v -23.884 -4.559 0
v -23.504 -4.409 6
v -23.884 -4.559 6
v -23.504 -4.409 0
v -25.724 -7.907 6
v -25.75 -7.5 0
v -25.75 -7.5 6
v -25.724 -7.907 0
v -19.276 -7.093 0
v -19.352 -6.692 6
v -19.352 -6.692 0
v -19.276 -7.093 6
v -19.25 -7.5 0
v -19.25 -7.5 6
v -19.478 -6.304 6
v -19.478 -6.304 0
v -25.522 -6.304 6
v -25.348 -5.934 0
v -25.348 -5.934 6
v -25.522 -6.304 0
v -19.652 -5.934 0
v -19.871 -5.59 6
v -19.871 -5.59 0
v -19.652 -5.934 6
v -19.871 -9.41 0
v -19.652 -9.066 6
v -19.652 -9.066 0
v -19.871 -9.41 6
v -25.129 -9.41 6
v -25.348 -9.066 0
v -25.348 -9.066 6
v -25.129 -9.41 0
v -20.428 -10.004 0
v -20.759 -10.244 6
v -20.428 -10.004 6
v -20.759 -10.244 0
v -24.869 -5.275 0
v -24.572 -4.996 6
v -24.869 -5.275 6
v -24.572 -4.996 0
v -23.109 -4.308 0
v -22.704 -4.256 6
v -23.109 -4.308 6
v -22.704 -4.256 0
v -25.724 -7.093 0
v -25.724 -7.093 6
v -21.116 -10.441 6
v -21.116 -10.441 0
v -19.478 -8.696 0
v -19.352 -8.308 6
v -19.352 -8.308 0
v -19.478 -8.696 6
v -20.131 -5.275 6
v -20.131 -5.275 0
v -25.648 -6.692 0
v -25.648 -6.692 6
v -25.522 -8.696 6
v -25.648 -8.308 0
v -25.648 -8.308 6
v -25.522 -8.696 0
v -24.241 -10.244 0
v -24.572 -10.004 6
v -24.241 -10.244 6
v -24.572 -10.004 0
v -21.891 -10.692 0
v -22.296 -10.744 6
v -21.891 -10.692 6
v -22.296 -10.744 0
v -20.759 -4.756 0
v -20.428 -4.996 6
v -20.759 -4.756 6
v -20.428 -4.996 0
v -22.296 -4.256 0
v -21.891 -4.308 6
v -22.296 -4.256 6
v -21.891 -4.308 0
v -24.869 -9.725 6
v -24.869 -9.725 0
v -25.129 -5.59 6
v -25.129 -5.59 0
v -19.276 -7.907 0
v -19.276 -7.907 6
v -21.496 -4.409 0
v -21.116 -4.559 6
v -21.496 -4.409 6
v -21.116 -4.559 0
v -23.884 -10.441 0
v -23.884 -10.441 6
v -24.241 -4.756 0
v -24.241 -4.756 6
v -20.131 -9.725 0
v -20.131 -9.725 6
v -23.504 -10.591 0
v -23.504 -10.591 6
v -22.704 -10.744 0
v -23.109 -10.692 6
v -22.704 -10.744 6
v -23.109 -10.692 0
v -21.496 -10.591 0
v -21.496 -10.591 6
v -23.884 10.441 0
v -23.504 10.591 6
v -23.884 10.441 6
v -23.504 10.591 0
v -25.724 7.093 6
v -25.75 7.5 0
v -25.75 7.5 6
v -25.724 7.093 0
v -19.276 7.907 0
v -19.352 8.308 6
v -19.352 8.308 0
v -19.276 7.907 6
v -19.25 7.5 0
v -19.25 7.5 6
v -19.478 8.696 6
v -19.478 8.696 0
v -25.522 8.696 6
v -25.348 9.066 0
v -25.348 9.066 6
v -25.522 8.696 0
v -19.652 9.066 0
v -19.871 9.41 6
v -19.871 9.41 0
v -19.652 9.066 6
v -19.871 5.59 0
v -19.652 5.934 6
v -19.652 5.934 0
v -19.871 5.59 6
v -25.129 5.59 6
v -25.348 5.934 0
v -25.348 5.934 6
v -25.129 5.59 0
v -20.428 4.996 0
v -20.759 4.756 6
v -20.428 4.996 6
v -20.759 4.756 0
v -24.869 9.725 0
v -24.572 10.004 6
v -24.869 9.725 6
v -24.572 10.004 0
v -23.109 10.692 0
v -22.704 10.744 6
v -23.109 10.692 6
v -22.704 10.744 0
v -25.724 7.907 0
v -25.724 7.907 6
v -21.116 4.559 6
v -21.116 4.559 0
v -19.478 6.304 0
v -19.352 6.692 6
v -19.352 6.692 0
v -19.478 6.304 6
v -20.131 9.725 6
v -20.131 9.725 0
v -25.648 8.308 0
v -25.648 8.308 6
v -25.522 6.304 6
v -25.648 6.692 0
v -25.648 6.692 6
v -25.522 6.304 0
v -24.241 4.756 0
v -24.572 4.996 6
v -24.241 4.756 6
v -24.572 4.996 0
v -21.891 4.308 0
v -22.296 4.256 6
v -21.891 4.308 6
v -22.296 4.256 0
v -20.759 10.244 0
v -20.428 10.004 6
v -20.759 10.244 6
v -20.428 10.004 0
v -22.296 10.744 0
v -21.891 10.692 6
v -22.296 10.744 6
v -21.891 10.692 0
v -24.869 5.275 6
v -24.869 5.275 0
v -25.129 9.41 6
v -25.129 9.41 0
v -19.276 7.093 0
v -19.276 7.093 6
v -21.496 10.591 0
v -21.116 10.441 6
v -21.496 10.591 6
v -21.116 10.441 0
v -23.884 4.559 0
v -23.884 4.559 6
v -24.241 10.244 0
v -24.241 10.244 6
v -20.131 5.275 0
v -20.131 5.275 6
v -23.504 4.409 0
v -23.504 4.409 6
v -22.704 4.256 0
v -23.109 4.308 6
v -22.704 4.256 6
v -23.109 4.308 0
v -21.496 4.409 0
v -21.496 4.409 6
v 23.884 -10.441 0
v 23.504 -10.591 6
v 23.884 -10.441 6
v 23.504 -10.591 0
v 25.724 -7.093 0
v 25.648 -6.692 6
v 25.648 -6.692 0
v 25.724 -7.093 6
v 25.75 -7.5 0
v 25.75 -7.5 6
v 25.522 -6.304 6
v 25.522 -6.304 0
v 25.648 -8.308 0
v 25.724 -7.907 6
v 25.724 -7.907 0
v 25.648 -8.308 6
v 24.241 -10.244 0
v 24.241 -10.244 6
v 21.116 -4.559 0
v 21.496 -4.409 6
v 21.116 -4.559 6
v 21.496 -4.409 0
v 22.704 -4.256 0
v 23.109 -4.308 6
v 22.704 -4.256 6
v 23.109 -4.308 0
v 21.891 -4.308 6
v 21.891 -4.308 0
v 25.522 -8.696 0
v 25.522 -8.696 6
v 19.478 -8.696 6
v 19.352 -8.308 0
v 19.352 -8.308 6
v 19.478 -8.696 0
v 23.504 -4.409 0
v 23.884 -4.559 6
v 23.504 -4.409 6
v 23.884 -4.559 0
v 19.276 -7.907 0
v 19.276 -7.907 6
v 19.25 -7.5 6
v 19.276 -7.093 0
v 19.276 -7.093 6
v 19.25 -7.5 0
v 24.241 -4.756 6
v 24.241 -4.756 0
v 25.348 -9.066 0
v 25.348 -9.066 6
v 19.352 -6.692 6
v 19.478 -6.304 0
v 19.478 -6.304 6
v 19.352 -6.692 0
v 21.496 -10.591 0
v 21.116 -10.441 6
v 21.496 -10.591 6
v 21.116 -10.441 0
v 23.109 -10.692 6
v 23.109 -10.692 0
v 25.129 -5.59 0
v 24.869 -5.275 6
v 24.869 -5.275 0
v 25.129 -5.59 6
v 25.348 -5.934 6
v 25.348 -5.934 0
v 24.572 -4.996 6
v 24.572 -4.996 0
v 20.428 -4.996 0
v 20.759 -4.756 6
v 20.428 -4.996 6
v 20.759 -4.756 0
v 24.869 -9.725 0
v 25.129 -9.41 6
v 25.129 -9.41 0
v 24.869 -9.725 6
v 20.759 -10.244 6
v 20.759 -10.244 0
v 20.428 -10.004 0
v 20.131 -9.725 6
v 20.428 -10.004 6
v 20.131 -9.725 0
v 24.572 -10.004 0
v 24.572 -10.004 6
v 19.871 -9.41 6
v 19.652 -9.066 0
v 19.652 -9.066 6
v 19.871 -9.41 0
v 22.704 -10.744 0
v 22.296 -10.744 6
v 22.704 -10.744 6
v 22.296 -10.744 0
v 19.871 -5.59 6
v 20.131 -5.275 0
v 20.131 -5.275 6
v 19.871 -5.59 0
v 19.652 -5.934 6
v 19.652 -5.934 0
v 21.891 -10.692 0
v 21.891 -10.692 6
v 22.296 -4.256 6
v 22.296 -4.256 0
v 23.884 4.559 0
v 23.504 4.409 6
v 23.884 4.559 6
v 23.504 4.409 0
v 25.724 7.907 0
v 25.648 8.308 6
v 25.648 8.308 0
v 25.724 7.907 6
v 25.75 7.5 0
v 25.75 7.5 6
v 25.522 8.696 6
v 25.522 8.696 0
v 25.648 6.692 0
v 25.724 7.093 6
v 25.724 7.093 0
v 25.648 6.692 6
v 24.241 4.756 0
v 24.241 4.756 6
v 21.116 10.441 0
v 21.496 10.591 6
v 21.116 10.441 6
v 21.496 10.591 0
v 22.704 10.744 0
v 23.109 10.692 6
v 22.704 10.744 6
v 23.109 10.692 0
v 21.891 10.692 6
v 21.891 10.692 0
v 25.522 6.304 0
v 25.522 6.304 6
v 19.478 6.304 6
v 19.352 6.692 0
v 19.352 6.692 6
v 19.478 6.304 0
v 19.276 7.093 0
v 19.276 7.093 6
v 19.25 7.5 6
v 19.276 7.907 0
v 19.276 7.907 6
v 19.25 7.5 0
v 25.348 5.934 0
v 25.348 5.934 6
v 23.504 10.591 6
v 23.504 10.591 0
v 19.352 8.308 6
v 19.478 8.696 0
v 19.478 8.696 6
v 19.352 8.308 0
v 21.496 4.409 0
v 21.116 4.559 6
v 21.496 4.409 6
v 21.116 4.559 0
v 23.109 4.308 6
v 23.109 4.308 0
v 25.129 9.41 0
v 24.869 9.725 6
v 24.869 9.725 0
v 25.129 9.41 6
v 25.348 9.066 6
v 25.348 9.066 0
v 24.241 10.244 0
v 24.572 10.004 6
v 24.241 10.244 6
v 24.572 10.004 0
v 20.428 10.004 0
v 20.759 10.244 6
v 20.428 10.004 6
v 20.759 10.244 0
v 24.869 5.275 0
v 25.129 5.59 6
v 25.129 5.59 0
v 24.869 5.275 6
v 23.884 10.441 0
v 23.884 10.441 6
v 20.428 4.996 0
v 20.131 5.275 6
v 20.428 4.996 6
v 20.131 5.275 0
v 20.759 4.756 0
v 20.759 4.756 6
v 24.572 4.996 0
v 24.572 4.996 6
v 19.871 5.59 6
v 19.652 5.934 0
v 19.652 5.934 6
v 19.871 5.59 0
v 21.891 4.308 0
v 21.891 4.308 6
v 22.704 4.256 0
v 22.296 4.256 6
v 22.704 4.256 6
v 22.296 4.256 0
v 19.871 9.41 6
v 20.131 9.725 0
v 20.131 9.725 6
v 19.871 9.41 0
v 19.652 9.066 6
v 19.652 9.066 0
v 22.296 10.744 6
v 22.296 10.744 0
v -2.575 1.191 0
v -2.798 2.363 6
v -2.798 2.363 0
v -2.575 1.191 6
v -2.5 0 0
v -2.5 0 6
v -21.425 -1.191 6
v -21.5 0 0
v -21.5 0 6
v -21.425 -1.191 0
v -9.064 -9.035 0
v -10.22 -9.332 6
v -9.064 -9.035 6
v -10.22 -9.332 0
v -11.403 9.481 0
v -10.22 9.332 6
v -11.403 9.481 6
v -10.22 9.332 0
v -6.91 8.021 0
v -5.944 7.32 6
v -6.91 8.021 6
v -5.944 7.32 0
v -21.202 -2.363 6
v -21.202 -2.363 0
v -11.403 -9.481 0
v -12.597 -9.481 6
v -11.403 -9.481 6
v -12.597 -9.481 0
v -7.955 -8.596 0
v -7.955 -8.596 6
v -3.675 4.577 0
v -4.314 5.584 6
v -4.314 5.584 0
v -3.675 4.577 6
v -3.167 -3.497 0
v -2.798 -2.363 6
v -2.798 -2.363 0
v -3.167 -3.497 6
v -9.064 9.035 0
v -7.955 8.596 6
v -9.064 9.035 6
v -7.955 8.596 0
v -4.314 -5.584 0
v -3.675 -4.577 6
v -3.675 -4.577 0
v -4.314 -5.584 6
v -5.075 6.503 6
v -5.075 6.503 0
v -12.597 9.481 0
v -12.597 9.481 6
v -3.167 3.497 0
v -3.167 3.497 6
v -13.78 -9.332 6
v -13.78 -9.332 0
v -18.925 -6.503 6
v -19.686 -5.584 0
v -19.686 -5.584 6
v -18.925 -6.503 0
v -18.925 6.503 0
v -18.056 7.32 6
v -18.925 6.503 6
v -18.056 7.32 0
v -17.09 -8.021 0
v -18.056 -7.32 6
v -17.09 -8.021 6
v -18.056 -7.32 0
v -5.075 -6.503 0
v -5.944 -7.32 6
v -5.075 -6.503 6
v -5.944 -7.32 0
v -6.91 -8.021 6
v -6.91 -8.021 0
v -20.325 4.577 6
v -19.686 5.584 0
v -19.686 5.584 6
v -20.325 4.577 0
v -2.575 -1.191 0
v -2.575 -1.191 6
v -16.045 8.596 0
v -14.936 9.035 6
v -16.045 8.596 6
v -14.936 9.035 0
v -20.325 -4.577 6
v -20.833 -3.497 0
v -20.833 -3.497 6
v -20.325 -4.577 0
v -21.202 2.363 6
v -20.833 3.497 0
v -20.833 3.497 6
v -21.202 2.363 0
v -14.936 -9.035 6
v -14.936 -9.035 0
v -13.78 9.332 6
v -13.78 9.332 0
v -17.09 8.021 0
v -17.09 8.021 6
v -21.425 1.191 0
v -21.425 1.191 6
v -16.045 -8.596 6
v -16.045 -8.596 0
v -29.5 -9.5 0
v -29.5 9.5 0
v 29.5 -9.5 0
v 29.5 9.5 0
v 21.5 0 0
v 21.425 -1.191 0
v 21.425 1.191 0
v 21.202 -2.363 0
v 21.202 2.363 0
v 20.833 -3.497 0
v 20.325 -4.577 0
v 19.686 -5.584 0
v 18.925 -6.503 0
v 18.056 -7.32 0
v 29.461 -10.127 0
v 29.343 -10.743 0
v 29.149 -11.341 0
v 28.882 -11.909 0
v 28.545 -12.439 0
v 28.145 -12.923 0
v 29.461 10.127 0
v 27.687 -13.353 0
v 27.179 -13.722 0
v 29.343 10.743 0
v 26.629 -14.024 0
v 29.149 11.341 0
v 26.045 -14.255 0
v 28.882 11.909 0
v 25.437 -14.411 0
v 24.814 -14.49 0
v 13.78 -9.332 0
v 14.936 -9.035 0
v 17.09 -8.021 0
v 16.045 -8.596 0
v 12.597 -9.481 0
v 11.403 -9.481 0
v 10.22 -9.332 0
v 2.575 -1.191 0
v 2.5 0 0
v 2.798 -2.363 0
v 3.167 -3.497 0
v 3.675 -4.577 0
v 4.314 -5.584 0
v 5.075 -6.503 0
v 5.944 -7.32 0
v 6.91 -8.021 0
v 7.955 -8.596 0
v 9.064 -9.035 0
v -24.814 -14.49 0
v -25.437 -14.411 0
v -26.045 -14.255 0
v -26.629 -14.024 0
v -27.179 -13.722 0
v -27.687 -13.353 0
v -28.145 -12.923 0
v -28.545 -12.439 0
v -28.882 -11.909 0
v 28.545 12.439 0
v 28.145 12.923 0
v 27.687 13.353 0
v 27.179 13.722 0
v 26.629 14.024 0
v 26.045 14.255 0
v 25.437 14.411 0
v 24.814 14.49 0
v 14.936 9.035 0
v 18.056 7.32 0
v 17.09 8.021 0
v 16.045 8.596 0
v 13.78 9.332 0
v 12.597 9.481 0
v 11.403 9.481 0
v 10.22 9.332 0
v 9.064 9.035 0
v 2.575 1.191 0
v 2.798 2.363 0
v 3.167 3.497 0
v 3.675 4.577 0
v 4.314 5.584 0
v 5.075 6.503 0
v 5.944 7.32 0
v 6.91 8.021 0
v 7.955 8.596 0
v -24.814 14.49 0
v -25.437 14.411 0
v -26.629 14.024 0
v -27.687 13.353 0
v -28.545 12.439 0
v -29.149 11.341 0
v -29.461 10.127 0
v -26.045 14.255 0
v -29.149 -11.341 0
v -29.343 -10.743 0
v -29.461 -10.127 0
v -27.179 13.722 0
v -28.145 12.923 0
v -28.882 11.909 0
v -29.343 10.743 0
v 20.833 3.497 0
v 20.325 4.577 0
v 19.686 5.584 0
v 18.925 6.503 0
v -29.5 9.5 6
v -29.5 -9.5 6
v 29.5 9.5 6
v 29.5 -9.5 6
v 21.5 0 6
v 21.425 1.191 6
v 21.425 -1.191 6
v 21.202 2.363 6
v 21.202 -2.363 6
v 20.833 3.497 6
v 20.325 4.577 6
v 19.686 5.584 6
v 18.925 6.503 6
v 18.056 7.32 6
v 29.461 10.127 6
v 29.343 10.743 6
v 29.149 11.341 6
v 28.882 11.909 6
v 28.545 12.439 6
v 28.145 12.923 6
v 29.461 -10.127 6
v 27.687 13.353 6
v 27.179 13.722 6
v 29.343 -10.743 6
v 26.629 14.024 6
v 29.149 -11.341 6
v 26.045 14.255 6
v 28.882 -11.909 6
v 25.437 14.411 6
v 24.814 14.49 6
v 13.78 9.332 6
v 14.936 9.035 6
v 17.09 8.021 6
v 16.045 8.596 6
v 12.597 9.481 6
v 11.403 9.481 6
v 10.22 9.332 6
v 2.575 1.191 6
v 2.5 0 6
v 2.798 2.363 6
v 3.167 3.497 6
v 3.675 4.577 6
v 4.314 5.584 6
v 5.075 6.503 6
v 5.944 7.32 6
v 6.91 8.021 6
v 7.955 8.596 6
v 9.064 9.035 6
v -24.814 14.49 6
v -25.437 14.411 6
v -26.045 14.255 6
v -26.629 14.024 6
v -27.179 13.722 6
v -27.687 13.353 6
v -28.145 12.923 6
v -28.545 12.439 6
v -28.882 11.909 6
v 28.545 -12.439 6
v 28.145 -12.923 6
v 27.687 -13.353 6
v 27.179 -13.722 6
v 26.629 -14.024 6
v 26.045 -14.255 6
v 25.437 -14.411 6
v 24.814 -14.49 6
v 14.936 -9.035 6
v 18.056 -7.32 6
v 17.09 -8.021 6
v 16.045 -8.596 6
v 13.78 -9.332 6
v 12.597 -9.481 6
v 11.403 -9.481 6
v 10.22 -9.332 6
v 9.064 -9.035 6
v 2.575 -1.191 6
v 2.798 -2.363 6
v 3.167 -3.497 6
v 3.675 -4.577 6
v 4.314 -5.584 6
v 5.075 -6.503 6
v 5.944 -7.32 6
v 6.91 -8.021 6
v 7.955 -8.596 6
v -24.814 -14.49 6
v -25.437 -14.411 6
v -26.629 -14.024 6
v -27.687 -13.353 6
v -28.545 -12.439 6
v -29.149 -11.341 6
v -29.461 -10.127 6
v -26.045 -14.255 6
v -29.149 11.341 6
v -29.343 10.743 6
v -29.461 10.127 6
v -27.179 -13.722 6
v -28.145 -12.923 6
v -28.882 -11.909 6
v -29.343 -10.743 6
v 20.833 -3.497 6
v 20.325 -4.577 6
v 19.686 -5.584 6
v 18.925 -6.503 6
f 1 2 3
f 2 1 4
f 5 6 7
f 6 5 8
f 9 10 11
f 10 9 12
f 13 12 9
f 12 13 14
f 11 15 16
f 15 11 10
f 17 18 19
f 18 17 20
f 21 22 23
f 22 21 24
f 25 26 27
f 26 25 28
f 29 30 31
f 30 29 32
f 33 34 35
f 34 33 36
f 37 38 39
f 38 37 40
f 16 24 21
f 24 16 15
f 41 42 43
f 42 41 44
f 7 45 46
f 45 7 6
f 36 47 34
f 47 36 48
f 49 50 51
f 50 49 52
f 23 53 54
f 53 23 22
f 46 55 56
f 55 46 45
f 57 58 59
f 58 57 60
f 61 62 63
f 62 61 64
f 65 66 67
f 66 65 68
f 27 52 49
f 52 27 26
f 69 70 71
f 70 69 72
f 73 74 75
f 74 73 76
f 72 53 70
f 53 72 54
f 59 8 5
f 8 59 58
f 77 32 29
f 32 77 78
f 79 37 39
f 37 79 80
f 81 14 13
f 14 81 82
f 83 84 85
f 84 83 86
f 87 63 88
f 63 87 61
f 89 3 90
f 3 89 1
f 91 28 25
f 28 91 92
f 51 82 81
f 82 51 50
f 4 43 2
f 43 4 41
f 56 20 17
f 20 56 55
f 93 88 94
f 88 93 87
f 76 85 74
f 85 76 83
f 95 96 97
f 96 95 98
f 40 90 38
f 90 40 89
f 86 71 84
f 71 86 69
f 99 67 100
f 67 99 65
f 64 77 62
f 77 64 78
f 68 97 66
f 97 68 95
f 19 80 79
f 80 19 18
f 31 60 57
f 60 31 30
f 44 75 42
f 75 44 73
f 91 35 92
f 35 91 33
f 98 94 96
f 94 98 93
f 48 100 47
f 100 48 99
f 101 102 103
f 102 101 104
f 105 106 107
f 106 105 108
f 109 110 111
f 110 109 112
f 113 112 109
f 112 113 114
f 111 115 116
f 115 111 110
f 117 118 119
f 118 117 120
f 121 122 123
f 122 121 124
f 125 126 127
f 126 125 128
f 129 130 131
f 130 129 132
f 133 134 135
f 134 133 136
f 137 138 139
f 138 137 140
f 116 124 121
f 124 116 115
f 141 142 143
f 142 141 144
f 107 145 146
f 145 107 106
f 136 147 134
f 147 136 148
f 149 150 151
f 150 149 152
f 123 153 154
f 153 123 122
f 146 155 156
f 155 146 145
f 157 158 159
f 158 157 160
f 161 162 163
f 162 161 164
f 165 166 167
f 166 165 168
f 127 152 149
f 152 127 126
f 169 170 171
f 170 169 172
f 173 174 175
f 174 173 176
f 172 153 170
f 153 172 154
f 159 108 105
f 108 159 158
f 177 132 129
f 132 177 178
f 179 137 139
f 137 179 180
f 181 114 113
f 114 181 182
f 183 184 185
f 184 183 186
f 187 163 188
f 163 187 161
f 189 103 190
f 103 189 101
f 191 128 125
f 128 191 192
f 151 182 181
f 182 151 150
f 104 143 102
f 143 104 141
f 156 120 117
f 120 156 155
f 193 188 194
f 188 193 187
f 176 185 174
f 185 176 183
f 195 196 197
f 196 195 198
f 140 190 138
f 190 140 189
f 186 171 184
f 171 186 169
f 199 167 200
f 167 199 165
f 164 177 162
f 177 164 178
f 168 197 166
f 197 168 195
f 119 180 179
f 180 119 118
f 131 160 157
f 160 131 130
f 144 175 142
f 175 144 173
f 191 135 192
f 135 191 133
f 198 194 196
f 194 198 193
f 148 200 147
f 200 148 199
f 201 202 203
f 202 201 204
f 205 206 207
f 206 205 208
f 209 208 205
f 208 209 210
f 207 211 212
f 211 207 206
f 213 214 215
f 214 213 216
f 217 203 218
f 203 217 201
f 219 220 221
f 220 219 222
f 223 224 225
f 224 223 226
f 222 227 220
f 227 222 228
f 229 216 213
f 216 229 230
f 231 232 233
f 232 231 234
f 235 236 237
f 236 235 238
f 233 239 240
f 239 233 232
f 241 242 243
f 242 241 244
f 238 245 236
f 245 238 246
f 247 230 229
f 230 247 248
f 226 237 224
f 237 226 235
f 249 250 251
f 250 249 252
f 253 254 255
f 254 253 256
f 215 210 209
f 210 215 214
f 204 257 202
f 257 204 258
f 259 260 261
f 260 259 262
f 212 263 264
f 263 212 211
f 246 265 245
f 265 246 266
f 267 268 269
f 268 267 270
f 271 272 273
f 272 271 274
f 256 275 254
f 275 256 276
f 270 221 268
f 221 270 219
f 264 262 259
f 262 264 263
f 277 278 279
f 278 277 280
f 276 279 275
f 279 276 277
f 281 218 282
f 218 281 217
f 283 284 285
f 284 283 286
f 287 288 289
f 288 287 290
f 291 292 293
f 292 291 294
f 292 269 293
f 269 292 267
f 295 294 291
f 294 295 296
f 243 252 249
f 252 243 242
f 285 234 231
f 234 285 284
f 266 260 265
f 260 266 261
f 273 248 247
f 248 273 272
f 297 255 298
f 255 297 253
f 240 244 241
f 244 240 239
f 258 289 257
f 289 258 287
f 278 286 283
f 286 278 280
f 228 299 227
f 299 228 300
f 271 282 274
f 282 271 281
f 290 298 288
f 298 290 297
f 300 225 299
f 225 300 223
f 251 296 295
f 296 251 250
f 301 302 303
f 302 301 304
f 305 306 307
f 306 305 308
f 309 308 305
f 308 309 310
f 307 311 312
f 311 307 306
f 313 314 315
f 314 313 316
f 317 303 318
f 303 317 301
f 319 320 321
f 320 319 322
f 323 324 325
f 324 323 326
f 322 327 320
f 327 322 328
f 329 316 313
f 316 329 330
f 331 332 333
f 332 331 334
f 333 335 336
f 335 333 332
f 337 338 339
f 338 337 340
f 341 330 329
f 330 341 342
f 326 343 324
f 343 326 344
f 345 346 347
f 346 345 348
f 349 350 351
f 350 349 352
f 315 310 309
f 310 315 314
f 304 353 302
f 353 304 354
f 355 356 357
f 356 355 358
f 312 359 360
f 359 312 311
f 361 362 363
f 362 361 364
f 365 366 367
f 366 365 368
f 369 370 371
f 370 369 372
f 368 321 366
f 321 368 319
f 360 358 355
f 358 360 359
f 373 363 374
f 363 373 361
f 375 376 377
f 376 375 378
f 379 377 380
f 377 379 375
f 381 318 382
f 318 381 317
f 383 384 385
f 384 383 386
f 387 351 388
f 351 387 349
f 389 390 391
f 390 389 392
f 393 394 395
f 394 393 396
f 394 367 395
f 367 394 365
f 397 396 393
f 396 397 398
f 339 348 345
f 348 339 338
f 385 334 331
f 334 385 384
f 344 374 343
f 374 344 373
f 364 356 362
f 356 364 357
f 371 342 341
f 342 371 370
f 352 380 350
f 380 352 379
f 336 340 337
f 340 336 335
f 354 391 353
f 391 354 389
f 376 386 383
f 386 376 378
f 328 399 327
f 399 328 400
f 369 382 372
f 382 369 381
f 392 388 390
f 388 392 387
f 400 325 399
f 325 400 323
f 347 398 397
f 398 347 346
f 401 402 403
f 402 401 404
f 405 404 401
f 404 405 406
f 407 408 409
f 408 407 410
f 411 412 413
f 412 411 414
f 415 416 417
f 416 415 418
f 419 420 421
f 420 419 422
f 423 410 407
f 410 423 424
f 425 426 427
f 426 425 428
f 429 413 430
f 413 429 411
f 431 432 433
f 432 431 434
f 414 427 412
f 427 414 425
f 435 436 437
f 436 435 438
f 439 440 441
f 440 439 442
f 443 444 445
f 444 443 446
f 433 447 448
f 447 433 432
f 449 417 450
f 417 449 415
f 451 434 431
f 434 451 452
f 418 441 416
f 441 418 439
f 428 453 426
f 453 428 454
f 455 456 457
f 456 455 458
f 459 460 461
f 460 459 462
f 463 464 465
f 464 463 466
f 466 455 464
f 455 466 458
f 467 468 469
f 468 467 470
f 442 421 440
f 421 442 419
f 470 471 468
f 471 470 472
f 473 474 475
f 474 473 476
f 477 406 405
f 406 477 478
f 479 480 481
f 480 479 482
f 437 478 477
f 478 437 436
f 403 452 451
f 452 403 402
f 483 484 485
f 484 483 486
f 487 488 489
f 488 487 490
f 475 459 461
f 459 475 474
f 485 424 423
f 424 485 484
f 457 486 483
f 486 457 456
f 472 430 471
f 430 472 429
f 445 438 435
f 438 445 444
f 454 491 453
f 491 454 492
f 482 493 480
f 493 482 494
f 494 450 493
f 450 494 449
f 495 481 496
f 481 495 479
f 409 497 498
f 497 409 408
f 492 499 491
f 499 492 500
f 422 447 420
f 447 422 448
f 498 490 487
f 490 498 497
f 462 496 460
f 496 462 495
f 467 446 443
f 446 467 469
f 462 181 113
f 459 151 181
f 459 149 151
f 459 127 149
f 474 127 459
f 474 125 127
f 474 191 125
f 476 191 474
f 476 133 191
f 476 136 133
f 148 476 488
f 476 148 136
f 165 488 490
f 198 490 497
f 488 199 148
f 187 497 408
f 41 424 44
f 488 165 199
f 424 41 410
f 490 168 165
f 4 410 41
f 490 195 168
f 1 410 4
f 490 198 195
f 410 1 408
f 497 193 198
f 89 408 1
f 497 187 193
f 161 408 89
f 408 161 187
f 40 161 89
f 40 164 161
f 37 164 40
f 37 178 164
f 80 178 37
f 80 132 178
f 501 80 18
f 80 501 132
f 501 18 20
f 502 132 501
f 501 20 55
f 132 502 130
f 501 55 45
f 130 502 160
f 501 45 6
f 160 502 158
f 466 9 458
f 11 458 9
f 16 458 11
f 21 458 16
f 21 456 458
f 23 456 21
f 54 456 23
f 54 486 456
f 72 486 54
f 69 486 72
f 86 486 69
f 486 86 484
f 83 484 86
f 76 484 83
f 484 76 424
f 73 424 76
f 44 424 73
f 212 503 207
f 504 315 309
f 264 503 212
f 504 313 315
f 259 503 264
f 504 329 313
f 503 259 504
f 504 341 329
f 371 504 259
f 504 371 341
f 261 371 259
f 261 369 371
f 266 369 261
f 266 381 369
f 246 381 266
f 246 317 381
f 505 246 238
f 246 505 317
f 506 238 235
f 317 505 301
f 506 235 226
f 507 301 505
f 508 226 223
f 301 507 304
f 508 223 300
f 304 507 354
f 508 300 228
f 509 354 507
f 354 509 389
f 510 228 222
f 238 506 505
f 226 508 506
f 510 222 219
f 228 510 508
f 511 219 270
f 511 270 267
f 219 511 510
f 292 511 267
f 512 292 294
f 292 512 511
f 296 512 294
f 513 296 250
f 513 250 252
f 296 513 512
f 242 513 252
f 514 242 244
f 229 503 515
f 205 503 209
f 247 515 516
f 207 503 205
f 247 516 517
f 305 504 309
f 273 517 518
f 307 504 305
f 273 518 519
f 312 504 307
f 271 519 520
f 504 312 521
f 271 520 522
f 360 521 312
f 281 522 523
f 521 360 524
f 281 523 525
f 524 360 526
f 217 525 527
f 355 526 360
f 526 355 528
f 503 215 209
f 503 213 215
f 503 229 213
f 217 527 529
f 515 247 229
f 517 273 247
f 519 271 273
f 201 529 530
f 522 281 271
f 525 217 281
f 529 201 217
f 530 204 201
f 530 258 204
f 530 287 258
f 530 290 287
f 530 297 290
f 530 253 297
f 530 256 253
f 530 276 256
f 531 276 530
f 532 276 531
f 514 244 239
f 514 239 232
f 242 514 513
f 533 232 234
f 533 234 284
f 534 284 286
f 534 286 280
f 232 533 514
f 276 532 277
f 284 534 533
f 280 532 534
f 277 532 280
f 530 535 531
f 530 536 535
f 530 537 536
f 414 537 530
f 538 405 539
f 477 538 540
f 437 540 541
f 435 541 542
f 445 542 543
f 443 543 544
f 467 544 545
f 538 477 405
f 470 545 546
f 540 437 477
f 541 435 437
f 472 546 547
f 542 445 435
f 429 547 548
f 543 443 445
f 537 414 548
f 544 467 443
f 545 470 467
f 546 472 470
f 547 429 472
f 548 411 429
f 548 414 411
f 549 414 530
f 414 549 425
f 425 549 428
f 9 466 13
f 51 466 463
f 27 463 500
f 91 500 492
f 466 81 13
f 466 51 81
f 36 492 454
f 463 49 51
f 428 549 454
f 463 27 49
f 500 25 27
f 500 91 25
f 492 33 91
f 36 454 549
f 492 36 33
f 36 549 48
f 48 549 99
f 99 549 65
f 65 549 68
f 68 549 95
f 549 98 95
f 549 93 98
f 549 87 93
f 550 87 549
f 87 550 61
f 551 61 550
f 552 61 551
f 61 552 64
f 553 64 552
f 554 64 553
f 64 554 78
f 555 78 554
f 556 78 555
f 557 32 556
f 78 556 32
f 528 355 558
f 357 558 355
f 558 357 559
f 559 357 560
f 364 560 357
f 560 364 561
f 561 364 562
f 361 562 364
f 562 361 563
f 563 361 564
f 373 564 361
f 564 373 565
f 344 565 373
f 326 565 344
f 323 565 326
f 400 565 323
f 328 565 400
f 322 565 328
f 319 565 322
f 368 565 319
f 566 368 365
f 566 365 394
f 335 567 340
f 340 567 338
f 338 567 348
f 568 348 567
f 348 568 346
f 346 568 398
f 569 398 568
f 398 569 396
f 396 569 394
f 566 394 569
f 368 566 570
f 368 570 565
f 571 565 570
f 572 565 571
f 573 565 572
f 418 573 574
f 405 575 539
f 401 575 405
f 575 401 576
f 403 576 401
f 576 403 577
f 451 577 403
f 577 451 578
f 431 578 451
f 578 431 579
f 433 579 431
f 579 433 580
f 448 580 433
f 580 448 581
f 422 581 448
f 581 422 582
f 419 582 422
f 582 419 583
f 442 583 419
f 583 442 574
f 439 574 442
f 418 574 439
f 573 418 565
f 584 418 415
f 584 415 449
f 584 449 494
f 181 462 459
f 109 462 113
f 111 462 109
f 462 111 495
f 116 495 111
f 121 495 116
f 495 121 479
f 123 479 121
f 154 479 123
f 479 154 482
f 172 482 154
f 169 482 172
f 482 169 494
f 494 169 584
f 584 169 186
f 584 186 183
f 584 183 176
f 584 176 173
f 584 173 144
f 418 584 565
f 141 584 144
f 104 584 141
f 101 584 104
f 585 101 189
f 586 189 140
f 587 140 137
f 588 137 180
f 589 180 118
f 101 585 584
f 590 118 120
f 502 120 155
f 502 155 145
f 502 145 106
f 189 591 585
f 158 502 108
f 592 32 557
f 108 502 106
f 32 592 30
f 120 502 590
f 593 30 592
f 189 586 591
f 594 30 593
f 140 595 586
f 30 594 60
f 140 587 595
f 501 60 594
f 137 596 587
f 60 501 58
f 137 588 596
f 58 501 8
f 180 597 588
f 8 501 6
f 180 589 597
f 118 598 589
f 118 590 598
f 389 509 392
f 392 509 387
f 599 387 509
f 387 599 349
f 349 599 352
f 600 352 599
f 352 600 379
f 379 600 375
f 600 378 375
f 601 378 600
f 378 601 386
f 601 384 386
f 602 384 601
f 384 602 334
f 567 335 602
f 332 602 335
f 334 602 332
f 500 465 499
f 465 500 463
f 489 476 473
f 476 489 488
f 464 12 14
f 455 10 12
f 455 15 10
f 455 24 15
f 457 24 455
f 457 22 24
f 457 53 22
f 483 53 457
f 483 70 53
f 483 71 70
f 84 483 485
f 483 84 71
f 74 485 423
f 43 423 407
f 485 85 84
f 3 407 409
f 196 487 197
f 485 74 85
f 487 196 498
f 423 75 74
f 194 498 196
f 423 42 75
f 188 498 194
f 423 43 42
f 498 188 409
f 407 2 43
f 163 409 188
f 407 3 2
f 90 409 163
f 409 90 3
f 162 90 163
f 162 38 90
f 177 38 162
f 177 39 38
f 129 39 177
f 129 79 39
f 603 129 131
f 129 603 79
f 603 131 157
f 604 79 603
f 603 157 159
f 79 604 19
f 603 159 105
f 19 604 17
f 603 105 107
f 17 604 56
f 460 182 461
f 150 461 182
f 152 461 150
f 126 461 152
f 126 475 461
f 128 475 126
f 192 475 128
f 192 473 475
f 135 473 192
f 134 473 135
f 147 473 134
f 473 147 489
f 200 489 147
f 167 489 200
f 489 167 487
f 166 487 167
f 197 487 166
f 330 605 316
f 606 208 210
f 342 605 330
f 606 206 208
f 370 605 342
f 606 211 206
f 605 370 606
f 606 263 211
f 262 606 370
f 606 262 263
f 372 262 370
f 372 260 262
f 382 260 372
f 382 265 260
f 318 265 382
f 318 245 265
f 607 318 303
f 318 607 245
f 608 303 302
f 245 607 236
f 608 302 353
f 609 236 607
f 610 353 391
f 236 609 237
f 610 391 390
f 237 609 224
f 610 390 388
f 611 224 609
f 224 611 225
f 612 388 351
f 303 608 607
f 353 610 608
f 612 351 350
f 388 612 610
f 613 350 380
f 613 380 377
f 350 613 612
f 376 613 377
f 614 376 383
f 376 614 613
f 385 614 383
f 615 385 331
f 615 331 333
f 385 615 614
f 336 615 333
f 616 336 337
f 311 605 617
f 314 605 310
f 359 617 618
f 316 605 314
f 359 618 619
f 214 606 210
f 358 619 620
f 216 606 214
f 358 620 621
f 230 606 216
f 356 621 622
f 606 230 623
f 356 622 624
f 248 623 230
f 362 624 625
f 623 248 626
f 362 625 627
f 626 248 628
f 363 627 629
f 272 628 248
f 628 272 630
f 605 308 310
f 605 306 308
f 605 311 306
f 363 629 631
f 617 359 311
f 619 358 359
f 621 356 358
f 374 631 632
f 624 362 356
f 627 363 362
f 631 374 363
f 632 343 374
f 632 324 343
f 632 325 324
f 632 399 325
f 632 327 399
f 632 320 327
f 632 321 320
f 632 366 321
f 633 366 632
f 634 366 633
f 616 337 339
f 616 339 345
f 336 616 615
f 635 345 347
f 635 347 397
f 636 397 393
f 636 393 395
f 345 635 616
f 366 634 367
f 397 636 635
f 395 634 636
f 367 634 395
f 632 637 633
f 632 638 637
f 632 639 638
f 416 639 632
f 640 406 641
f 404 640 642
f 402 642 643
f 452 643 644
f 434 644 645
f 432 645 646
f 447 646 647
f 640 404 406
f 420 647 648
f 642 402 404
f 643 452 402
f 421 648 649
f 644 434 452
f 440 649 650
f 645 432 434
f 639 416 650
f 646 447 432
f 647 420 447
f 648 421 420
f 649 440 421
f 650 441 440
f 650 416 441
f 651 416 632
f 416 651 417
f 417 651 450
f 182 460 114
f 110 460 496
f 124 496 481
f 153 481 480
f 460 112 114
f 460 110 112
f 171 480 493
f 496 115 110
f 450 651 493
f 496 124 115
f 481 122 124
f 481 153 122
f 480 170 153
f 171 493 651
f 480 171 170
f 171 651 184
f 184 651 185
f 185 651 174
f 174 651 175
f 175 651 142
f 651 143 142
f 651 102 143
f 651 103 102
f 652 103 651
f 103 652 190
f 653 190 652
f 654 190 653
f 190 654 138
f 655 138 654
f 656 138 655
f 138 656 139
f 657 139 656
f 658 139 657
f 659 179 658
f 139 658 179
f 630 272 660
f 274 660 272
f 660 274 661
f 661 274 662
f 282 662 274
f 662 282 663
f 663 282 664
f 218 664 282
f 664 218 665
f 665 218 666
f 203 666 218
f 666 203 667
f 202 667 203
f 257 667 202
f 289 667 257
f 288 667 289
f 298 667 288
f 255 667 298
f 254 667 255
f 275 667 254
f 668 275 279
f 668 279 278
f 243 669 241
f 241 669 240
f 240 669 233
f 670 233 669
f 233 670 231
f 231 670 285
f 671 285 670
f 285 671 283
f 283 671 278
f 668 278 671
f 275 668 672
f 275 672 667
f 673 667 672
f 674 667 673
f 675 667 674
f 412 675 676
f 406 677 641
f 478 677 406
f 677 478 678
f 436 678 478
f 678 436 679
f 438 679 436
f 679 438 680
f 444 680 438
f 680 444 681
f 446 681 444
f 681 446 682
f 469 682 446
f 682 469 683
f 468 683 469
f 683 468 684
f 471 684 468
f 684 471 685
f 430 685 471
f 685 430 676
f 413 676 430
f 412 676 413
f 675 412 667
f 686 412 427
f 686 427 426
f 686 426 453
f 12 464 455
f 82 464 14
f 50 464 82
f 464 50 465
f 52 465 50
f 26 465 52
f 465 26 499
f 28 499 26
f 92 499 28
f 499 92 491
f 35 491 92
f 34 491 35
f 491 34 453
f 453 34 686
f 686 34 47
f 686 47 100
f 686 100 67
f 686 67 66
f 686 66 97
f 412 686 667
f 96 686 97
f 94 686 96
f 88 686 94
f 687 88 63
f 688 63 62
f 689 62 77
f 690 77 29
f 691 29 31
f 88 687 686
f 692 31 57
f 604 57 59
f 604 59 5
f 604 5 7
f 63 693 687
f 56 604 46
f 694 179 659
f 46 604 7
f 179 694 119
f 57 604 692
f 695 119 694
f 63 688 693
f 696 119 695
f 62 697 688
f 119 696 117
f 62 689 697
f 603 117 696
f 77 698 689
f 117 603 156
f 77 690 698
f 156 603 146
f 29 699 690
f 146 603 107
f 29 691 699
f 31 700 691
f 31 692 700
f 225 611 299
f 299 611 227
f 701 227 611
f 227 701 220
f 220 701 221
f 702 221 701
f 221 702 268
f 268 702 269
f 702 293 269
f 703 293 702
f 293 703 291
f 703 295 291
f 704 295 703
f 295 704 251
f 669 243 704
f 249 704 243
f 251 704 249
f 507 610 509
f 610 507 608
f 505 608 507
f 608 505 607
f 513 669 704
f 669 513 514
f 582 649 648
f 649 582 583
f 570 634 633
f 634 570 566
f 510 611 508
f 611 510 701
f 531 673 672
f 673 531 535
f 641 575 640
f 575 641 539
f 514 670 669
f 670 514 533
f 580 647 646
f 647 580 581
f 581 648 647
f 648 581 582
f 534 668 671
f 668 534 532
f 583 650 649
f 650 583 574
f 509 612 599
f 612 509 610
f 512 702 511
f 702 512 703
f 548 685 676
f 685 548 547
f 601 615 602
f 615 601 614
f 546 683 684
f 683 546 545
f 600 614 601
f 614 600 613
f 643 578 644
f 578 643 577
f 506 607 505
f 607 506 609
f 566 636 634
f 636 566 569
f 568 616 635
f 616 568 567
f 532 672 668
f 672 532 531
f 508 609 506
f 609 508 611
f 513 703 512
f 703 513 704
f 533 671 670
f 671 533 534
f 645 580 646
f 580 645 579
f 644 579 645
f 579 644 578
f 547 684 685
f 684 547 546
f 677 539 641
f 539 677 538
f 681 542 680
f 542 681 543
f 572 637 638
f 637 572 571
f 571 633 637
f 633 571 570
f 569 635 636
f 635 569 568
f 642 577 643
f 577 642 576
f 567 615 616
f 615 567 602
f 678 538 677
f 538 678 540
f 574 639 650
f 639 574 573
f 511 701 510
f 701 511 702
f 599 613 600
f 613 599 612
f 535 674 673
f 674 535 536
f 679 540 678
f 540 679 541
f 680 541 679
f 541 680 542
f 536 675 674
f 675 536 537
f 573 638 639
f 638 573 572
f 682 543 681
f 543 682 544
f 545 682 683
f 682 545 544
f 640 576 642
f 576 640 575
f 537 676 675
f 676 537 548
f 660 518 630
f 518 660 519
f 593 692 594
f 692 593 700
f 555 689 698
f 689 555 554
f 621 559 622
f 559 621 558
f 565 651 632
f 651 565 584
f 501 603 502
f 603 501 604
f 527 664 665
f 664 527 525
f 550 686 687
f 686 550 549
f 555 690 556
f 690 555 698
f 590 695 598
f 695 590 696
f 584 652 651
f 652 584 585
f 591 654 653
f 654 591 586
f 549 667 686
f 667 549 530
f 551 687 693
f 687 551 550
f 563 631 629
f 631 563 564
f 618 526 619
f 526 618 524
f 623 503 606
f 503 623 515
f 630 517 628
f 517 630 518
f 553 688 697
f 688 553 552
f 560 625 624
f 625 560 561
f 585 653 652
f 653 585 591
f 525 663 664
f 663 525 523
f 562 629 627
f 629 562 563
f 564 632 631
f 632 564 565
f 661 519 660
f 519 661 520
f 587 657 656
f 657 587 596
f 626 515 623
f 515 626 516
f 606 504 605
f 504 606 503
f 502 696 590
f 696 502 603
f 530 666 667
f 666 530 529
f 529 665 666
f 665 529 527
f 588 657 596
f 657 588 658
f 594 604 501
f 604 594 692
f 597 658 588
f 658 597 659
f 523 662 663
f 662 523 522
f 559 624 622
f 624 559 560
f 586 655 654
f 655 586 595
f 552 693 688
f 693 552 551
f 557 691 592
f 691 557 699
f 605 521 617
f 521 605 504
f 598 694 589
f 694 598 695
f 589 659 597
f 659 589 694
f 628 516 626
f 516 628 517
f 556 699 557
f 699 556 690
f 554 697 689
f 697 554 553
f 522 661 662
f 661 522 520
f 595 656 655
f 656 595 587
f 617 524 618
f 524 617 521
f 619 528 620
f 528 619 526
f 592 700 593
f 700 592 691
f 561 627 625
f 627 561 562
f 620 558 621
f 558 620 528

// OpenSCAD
$fn = 50;


difference() {
	union() {
		hull() {
			translate(v = [-24.5000000000, 9.5000000000, 0]) {
				cylinder(h = 6, r = 5);
			}
			translate(v = [24.5000000000, 9.5000000000, 0]) {
				cylinder(h = 6, r = 5);
			}
			translate(v = [-24.5000000000, -9.5000000000, 0]) {
				cylinder(h = 6, r = 5);
			}
			translate(v = [24.5000000000, -9.5000000000, 0]) {
				cylinder(h = 6, r = 5);
			}
		}
	}
	union() {
		#translate(v = [-22.5000000000, -7.5000000000, -100.0000000000]) {
			cylinder(h = 200, r = 3.2500000000);
		}
		#translate(v = [-22.5000000000, 7.5000000000, -100.0000000000]) {
			cylinder(h = 200, r = 3.2500000000);
		}
		#translate(v = [22.5000000000, -7.5000000000, -100.0000000000]) {
			cylinder(h = 200, r = 3.2500000000);
		}
		#translate(v = [22.5000000000, 7.5000000000, -100.0000000000]) {
			cylinder(h = 200, r = 3.2500000000);
		}
		#translate(v = [-12.0000000000, 0, 0]) {
			cylinder(h = 6, r = 9.5000000000);
		}
		#translate(v = [12.0000000000, 0, 0]) {
			cylinder(h = 6, r = 9.5000000000);
		}
	}
}
